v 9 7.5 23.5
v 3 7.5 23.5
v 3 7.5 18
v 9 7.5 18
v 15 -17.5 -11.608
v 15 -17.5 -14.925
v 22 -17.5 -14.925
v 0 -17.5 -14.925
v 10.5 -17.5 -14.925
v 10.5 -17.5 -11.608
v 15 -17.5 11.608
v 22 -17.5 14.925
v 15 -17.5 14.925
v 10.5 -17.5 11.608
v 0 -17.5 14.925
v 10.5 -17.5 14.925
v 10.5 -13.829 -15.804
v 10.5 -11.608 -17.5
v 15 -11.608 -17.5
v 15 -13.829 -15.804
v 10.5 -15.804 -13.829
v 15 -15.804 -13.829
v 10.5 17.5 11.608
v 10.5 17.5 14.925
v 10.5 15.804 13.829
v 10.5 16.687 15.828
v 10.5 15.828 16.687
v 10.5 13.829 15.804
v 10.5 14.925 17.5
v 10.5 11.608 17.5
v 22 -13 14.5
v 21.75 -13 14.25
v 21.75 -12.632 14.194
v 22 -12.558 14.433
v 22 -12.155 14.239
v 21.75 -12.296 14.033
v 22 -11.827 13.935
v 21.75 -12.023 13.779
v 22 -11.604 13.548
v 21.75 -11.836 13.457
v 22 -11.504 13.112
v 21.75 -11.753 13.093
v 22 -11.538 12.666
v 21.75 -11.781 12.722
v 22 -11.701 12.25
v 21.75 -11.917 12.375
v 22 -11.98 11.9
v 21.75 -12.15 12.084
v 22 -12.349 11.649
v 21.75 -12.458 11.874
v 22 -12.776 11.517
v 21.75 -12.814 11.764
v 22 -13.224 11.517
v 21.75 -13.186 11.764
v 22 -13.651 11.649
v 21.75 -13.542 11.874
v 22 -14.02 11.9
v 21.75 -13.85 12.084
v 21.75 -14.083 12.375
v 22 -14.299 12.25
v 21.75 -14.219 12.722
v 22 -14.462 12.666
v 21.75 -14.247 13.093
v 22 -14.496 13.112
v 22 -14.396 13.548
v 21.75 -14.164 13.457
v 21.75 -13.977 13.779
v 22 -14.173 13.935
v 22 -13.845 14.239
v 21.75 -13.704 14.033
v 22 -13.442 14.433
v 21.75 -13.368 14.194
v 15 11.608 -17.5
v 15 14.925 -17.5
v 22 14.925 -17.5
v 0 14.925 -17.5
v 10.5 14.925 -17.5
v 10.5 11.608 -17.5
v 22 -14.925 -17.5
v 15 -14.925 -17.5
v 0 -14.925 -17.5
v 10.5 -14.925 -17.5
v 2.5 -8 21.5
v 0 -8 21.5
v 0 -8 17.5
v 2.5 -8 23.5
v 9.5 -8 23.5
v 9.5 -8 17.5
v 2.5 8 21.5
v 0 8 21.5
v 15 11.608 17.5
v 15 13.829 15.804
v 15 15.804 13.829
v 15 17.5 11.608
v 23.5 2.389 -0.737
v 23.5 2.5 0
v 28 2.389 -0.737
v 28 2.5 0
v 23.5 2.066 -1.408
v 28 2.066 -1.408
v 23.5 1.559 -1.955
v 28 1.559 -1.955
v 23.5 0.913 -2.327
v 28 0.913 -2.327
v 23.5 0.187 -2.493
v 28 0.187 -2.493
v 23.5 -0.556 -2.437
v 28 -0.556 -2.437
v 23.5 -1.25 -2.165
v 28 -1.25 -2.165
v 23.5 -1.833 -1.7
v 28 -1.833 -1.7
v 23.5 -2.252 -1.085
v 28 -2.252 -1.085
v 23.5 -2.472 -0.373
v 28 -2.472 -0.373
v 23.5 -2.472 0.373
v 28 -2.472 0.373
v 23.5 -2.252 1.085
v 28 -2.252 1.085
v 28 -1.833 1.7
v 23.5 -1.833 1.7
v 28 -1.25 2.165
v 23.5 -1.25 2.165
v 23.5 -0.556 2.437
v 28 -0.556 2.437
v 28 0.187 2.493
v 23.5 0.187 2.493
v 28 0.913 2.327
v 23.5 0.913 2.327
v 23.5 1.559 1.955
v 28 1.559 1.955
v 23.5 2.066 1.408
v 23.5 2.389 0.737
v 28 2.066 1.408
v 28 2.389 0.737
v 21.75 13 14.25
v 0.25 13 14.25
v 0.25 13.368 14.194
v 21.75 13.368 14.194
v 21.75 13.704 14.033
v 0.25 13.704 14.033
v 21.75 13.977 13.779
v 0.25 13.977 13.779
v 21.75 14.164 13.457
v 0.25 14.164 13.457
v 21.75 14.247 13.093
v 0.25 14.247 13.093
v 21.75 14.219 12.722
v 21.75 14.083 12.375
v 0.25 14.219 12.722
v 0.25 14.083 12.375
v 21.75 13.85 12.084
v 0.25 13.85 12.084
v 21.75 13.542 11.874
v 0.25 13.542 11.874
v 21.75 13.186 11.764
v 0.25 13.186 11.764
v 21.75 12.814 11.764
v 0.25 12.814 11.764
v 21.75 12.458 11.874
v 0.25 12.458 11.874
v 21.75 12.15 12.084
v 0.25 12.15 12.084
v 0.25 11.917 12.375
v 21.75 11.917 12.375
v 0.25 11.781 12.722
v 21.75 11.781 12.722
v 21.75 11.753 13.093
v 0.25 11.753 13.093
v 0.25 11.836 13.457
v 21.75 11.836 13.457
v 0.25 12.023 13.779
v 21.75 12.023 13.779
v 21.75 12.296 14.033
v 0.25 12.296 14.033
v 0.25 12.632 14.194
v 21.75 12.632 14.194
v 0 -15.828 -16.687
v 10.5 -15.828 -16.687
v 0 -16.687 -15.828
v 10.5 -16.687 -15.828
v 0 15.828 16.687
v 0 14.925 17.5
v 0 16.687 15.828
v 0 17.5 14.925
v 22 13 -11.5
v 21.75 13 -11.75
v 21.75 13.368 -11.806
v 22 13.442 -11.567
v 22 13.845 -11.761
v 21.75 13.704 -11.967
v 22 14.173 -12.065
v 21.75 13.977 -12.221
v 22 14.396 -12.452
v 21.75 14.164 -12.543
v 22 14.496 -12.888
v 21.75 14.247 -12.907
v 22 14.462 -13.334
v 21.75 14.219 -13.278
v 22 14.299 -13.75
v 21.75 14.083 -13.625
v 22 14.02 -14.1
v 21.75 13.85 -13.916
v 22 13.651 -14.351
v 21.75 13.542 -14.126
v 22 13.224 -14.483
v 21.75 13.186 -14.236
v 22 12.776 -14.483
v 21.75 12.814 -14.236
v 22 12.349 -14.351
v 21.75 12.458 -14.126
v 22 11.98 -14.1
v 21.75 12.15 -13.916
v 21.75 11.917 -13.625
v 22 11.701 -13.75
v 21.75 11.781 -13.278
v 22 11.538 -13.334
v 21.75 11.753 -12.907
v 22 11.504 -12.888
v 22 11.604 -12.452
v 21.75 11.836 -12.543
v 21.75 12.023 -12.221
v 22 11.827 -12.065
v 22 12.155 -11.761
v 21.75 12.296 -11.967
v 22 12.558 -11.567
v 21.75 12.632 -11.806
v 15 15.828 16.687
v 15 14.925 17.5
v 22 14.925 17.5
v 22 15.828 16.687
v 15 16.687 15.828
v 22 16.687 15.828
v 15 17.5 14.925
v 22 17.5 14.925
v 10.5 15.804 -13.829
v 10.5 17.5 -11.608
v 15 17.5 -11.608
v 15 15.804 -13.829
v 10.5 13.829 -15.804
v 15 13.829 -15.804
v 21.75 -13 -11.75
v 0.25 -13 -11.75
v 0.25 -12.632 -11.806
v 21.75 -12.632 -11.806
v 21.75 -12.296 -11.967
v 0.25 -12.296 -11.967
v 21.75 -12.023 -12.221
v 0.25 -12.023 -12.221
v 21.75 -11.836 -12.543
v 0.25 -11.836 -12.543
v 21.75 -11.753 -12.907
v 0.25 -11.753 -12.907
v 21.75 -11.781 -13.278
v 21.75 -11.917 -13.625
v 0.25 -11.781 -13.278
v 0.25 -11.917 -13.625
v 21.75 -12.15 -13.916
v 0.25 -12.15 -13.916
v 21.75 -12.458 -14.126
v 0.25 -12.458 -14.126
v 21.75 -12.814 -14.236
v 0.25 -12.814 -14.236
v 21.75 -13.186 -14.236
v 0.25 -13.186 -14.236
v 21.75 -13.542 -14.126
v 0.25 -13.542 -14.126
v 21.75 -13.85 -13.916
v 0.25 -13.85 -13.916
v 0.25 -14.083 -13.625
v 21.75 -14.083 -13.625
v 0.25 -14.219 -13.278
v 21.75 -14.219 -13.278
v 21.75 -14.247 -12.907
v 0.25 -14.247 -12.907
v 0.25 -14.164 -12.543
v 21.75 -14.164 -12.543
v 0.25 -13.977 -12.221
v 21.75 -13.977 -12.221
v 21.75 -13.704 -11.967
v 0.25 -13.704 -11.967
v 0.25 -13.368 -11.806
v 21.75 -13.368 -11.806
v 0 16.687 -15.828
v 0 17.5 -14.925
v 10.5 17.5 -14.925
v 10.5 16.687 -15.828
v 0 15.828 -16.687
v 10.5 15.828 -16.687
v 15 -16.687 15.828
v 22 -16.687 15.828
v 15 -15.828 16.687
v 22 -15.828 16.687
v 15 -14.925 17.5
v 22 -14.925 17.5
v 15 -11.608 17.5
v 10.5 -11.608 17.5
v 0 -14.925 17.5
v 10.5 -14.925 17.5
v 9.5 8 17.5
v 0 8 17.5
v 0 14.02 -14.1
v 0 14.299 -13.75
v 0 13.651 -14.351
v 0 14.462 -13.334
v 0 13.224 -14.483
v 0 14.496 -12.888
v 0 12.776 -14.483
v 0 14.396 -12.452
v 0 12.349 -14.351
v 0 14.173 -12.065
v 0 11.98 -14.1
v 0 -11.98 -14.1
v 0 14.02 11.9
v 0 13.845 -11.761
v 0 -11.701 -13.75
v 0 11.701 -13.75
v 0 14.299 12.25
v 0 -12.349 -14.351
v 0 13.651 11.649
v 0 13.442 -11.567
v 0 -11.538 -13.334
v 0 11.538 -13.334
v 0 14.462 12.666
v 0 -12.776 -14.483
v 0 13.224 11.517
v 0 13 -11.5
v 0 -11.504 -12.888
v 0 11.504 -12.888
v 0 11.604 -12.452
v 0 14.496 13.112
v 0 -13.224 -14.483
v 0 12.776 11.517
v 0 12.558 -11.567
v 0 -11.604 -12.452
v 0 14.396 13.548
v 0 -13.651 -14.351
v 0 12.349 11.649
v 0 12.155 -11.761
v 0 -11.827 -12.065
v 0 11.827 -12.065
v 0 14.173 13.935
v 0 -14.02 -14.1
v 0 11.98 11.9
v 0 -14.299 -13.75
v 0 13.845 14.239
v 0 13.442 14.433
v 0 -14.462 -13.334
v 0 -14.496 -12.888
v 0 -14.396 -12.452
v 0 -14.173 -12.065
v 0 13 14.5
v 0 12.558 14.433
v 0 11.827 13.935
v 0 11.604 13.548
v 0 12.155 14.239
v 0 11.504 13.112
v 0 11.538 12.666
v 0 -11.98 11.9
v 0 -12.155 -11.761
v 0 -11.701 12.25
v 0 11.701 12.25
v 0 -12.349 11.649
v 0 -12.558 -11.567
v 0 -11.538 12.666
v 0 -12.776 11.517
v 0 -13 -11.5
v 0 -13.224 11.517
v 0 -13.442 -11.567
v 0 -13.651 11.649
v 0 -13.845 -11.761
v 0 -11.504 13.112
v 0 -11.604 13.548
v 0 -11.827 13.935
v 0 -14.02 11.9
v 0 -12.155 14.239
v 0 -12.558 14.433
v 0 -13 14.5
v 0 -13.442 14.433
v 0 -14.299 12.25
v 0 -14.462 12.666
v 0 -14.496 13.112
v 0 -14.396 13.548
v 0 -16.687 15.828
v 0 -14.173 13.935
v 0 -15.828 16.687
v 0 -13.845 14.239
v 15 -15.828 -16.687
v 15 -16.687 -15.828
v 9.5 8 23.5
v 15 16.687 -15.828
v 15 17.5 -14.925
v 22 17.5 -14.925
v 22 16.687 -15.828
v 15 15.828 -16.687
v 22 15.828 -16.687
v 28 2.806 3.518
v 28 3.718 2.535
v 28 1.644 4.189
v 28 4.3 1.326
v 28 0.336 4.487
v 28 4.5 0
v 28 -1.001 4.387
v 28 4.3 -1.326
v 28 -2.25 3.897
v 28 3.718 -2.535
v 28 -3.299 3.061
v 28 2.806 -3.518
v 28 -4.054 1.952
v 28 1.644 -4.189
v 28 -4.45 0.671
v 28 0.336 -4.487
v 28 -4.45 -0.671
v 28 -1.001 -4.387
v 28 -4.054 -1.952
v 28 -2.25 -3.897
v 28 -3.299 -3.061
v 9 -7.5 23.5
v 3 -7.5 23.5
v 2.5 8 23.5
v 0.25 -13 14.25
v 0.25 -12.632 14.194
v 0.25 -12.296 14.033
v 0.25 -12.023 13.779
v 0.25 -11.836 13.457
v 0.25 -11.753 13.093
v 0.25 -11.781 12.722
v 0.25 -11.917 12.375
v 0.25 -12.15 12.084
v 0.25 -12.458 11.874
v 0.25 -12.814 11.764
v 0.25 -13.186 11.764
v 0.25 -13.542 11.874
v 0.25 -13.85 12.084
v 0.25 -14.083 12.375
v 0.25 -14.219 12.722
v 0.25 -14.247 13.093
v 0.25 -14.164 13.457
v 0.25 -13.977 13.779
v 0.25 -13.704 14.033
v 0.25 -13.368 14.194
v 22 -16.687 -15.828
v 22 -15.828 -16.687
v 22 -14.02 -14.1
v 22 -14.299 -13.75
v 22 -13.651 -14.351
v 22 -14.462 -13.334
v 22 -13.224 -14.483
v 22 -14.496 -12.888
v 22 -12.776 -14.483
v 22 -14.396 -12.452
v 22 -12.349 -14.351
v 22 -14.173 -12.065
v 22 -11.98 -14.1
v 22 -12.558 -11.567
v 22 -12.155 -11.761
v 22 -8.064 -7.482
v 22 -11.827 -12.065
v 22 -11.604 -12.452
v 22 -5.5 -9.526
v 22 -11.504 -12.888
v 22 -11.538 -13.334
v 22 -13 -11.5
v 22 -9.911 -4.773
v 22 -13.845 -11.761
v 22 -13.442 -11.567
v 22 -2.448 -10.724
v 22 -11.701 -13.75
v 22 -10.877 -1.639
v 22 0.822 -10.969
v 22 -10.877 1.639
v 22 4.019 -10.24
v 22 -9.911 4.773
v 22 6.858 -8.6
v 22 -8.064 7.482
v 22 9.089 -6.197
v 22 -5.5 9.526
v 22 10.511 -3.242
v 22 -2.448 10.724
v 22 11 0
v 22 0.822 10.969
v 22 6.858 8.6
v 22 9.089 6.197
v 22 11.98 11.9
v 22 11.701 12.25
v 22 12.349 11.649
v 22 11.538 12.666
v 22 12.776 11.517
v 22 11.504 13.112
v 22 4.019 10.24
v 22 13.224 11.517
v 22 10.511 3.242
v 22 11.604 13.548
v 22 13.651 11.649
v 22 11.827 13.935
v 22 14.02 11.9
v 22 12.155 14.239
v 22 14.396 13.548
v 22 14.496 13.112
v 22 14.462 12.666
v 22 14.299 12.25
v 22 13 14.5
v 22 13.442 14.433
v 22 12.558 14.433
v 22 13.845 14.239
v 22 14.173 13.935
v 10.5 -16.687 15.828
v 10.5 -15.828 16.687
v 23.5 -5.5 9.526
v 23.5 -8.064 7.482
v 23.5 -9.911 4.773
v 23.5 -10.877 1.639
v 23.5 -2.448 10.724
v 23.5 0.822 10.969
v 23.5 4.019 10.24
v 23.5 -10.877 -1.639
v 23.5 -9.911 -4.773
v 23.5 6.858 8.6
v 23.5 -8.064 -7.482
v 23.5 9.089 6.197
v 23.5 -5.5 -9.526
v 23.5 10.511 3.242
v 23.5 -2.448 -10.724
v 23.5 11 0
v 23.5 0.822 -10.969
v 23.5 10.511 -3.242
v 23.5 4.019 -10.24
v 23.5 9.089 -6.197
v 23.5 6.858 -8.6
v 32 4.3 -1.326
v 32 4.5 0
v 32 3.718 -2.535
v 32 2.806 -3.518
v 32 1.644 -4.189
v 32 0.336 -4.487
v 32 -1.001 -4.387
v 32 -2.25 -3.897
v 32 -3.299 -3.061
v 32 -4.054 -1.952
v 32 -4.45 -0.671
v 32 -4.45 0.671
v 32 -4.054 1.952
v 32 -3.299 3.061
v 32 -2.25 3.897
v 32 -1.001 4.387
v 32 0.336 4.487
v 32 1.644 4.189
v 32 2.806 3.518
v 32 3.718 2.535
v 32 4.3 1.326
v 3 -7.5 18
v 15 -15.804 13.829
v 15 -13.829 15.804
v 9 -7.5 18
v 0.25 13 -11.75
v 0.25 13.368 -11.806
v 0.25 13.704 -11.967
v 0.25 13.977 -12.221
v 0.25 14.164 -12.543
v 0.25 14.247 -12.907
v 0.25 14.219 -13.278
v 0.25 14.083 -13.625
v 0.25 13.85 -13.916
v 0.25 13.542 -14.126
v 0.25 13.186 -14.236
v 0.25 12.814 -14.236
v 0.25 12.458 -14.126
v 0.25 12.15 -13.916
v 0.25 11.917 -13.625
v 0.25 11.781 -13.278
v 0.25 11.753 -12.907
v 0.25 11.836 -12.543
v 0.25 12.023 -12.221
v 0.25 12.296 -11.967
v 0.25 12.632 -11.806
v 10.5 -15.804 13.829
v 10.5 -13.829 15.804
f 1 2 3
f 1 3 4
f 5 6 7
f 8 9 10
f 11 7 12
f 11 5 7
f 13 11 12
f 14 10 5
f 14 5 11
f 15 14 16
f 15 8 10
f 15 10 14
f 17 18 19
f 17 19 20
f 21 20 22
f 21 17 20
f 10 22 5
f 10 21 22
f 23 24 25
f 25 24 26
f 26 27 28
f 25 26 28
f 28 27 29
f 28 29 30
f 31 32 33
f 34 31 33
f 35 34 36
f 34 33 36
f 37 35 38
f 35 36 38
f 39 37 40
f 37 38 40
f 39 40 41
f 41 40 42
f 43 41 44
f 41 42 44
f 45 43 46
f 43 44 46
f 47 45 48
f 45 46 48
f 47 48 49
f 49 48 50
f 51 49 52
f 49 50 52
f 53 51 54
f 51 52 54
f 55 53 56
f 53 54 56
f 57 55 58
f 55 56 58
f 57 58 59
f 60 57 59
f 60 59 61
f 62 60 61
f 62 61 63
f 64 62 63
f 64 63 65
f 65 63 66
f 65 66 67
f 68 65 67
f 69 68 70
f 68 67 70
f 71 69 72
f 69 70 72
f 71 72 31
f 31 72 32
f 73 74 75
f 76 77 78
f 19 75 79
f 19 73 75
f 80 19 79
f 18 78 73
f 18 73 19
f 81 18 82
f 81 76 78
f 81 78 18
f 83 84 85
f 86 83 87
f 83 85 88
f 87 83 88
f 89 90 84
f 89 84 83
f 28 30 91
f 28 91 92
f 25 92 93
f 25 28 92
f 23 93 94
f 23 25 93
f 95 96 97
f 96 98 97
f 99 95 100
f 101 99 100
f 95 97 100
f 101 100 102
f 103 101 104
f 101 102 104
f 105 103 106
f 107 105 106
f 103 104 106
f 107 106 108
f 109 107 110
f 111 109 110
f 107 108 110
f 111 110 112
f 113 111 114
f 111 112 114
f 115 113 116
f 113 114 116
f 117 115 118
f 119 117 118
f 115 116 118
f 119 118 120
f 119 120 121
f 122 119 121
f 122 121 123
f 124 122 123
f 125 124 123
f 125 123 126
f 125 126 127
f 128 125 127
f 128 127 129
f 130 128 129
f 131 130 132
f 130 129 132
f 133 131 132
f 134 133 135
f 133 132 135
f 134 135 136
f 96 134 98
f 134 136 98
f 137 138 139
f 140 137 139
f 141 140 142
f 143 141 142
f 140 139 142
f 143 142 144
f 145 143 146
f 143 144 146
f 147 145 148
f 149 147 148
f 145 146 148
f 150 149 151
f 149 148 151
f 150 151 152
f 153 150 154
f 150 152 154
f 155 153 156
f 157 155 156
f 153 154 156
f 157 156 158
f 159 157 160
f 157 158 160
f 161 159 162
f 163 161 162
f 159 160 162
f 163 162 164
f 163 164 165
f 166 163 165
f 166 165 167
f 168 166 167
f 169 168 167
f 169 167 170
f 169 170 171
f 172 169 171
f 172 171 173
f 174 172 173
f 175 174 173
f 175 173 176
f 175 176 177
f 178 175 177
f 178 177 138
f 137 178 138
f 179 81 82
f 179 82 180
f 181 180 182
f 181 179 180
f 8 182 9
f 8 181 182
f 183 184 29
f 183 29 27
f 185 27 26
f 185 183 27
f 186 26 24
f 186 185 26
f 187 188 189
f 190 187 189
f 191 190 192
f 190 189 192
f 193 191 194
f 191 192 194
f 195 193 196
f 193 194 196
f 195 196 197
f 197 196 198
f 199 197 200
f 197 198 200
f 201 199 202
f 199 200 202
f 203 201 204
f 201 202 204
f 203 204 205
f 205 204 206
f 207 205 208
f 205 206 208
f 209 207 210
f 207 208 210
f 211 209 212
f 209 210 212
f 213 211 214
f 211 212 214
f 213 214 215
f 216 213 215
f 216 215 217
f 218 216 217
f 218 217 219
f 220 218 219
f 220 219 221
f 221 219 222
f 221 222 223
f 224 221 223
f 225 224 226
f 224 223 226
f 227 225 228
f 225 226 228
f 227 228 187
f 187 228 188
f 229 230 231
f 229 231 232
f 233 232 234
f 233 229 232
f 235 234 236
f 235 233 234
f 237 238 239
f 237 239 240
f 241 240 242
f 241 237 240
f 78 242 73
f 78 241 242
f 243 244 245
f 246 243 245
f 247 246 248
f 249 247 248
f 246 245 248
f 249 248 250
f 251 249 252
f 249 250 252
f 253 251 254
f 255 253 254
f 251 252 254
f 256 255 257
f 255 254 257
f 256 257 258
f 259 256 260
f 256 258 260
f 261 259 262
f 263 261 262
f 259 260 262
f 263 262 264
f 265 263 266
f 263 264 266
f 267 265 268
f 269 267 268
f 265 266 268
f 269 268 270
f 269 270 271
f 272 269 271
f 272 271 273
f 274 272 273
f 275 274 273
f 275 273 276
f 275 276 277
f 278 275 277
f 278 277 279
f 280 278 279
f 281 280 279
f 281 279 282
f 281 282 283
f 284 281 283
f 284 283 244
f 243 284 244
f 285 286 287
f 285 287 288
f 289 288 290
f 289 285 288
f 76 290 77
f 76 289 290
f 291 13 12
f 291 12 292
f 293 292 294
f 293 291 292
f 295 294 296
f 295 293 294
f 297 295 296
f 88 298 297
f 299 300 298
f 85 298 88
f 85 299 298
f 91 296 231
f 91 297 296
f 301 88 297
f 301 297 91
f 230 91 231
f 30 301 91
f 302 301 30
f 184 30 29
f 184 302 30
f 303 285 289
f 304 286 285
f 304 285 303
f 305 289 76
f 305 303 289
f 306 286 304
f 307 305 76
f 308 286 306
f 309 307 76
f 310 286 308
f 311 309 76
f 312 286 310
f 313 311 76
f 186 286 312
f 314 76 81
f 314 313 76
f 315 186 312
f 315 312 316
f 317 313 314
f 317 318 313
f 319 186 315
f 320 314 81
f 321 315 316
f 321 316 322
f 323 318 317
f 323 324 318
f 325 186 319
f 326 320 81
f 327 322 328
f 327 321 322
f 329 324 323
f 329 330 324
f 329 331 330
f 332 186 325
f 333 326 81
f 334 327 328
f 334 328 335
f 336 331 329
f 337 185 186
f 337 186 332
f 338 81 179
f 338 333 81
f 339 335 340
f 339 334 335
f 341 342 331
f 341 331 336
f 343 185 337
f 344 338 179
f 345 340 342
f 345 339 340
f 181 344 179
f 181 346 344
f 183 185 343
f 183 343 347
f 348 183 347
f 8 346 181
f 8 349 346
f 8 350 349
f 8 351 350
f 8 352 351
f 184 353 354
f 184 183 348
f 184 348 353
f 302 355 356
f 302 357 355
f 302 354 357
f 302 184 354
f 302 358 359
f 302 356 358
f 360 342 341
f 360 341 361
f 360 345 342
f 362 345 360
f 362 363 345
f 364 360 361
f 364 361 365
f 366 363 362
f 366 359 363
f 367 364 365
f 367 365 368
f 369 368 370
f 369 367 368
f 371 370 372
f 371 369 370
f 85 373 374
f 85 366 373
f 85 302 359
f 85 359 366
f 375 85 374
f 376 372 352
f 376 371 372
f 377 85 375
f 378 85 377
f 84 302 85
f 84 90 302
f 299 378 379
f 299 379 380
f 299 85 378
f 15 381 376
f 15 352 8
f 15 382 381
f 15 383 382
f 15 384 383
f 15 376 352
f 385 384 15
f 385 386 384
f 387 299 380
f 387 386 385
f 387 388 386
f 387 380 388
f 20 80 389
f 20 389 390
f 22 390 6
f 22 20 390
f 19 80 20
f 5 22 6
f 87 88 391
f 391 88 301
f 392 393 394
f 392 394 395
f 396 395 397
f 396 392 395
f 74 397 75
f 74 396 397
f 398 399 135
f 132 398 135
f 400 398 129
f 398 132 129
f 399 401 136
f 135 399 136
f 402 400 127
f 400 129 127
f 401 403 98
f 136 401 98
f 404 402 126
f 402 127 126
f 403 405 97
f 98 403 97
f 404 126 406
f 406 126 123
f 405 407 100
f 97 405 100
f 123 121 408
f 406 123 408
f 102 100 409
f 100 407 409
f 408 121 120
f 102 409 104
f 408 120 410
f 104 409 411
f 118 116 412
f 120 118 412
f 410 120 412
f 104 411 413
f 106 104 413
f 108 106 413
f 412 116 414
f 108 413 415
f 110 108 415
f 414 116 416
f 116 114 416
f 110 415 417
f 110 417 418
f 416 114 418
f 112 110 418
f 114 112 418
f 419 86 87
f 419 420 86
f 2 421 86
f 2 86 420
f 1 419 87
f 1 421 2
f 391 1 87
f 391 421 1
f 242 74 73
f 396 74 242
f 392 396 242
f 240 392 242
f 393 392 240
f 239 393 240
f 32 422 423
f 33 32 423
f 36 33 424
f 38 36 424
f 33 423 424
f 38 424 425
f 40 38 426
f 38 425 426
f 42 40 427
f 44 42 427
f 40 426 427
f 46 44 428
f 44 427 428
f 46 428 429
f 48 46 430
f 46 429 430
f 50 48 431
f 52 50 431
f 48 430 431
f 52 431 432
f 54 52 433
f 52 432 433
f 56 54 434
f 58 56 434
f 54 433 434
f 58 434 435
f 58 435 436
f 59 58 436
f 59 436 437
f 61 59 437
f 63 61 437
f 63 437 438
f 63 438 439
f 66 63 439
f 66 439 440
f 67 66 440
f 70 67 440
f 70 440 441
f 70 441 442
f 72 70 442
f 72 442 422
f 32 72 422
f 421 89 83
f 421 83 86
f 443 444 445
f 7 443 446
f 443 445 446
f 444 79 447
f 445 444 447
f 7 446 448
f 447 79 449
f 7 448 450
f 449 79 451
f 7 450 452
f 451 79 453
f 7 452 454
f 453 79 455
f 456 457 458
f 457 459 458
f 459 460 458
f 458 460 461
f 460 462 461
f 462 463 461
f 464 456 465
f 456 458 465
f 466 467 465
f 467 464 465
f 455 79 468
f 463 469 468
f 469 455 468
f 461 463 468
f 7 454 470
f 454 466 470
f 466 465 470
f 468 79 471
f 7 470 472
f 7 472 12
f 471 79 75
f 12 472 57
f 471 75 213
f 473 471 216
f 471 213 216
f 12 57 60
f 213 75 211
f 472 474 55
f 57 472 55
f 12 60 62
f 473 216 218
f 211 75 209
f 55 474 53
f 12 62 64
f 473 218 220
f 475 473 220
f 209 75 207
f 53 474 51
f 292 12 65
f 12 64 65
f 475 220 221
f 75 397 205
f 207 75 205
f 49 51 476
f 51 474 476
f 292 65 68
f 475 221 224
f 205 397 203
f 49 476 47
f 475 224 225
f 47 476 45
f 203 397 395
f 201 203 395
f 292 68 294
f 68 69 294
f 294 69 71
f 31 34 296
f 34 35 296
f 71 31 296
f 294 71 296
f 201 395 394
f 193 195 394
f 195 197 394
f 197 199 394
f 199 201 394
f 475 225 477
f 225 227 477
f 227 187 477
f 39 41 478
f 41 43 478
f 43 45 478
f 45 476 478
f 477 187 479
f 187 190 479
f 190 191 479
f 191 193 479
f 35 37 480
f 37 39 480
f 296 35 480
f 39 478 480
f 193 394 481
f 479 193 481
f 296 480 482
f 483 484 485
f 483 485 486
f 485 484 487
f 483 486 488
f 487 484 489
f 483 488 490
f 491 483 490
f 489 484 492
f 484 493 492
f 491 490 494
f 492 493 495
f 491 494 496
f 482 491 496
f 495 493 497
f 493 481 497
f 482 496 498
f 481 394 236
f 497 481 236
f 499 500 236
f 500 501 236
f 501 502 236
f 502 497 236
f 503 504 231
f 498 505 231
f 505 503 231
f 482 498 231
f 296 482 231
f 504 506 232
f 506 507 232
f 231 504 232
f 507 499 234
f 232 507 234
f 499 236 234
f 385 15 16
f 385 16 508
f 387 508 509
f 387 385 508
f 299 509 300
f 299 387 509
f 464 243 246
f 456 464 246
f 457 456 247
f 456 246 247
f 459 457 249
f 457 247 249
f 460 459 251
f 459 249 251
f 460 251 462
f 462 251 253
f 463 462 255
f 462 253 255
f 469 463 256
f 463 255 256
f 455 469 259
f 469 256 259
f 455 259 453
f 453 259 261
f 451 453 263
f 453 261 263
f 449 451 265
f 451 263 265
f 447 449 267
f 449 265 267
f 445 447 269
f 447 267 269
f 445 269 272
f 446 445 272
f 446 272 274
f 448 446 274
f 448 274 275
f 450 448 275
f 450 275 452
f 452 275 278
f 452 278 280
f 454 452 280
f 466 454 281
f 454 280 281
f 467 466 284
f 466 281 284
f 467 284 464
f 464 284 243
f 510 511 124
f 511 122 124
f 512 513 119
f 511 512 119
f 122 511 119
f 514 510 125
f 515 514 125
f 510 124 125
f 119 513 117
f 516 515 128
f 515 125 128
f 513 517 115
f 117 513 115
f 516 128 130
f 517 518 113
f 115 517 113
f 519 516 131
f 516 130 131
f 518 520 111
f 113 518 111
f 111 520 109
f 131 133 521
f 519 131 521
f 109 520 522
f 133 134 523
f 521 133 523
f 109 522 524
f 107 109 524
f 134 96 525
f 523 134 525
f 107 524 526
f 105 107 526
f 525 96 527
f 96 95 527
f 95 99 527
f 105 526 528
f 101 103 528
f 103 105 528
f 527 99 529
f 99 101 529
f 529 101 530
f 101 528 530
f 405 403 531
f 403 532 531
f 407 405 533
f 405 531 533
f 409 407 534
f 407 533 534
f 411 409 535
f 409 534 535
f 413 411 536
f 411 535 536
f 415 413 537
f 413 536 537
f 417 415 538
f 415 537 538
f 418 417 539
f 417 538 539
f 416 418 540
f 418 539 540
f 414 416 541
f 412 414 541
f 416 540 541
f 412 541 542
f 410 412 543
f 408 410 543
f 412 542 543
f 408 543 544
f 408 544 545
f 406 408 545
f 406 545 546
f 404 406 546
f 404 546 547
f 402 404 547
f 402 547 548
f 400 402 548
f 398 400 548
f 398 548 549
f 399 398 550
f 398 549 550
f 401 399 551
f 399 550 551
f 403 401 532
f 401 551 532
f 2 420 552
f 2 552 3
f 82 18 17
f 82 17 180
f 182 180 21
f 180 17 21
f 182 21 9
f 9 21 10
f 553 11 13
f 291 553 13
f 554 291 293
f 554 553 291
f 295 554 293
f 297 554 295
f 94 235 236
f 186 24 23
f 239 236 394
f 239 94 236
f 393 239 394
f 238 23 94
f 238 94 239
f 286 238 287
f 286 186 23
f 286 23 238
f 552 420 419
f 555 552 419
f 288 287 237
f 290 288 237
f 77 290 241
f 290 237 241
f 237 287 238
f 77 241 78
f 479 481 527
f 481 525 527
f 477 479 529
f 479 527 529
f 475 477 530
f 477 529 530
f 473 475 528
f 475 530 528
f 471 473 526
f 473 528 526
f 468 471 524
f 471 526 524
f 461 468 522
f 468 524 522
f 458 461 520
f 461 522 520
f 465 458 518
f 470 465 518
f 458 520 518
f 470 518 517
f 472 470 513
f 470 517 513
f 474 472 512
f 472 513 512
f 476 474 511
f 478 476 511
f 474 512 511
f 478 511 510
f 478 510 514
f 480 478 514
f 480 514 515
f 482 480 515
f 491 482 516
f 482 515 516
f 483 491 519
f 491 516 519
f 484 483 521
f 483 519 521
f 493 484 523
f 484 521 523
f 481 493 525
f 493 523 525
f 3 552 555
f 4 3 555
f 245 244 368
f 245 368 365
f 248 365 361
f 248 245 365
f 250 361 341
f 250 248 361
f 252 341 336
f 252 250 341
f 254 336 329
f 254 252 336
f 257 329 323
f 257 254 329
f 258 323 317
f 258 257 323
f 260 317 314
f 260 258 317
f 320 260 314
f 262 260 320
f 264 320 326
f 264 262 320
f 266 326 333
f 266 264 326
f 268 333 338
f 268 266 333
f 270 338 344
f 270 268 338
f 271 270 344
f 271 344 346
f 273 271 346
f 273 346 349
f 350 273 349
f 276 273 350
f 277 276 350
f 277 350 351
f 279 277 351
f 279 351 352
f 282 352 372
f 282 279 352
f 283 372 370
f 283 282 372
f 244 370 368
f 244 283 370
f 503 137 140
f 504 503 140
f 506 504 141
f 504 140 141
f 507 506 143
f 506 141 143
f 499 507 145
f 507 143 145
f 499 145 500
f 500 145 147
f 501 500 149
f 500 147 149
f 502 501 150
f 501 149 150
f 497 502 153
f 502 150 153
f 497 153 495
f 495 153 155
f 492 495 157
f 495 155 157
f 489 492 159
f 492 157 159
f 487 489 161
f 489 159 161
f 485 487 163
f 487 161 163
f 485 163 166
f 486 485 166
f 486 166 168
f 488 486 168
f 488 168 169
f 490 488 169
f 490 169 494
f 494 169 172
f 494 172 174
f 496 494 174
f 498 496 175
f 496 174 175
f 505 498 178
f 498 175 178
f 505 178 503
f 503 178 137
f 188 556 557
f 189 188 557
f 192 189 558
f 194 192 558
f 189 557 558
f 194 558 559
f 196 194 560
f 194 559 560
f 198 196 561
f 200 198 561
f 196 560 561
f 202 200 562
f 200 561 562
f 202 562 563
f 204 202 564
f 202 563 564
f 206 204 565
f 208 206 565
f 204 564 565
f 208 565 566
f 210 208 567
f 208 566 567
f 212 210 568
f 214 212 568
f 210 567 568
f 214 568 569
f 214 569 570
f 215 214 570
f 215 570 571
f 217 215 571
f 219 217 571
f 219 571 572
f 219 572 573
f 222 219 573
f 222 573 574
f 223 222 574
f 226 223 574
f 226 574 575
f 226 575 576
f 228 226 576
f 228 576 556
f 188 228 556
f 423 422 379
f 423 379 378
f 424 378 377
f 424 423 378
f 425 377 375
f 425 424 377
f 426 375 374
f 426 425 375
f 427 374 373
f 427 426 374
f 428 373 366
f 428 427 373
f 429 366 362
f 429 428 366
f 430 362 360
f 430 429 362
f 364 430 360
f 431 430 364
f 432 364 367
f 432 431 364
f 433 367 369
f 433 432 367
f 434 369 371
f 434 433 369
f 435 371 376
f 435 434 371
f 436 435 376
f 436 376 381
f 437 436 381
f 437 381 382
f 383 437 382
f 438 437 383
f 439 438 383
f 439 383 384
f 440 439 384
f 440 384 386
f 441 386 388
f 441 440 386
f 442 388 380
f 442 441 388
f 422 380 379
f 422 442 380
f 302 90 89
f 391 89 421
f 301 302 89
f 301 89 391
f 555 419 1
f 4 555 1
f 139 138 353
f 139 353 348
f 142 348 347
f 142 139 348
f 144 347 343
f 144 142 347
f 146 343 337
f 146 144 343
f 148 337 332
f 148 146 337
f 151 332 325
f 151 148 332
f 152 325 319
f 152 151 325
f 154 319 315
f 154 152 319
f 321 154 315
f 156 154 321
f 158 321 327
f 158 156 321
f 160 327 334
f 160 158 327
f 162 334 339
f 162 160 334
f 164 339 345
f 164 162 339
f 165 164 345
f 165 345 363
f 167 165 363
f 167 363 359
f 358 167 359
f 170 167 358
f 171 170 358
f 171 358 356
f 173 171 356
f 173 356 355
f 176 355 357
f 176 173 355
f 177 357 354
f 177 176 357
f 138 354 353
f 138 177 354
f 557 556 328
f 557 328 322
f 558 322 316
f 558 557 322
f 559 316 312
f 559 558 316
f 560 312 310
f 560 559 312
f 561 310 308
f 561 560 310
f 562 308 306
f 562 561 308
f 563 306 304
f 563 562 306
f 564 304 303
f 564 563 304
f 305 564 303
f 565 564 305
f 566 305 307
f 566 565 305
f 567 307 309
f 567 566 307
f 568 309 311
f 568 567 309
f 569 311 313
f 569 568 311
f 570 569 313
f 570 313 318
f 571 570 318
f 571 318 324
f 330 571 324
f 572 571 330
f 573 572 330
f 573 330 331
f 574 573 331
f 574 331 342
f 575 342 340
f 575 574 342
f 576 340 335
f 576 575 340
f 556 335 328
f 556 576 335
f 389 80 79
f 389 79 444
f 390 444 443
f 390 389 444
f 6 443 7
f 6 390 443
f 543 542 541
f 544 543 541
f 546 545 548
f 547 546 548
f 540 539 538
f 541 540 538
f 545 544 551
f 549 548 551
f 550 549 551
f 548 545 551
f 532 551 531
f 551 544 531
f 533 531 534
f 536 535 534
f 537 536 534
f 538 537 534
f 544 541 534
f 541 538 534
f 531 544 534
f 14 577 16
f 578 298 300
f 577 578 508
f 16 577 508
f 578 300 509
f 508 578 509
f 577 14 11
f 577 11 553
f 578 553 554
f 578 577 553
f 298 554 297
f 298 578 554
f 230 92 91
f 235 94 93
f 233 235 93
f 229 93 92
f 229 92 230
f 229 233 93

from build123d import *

# Parameters (mm, degrees)
BOSS_EXTRUDE1_DEPTH       = 10.5
BOSS_EXTRUDE2_DEPTH       = 4.5
BOSS_EXTRUDE3_DEPTH       = 7
SKETCH4_W                 = 9.5
SKETCH4_H                 = 16
BOSS_EXTRUDE4_DEPTH       = 6
SKETCH5_W                 = 2.5
SKETCH5_H                 = 2
CUT_EXTRUDE1_DEPTH        = 26.5
SKETCH6_W                 = 6
SKETCH6_H                 = 15
CUT_EXTRUDE2_DEPTH        = 5.5
F_2_CLEARANCE_HOLE1_D     = 2.5
F_2_CLEARANCE_HOLE1_DEPTH = 22
CHAMFER1_SIZE             = 0.25


with BuildPart() as part:
    # Sketch1 → Boss-Extrude1 (new body)
    with BuildSketch(Plane(origin=(0, 0, 0), x_dir=(0, -1, 0), z_dir=(-1, 0, 0))):
        with BuildLine():
            Line((14.924811557, 17.5), (-14.924811557, 17.5))
            ThreePointArc((-14.924811557, 17.5), (-16.263455967, 16.263455967), (-17.5, 14.924811557))
            Line((-17.5, 14.924811557), (-17.5, -14.924811557))
            ThreePointArc((-17.5, -14.924811557), (-16.263455967, -16.263455967), (-14.924811557, -17.5))
            Line((-14.924811557, -17.5), (14.924811557, -17.5))
            ThreePointArc((14.924811557, -17.5), (16.263455967, -16.263455967), (17.5, -14.924811557))
            Line((17.5, -14.924811557), (17.5, 14.924811557))
            ThreePointArc((17.5, 14.924811557), (16.263455967, 16.263455967), (14.924811557, 17.5))
        make_face()
    extrude(amount=-BOSS_EXTRUDE1_DEPTH)

    # Sketch2 → Boss-Extrude2 (add)
    with BuildSketch(Plane(origin=(10.5, 0, 0), x_dir=(0, 0, -1), z_dir=(1, 0, 0))):
        with BuildLine():
            Line((-17.5, -11.608186766), (-17.5, 11.608186766))
            ThreePointArc((-17.5, 11.608186766), (-14.849242405, 14.849242405), (-11.608186766, 17.5))
            Line((-11.608186766, 17.5), (11.608186766, 17.5))
            ThreePointArc((11.608186766, 17.5), (14.849242405, 14.849242405), (17.5, 11.608186766))
            Line((17.5, 11.608186766), (17.5, -11.608186766))
            ThreePointArc((17.5, -11.608186766), (14.849242405, -14.849242405), (11.608186766, -17.5))
            Line((11.608186766, -17.5), (-11.608186766, -17.5))
            ThreePointArc((-11.608186766, -17.5), (-14.849242405, -14.849242405), (-17.5, -11.608186766))
        make_face()
    extrude(amount=BOSS_EXTRUDE2_DEPTH)

    # Sketch3 → Boss-Extrude3 (add)
    with BuildSketch(Plane(origin=(15, 0, 0), x_dir=(0, 0, -1), z_dir=(1, 0, 0))):
        with BuildLine():
            Line((17.5, 14.924811557), (17.5, -14.924811557))
            ThreePointArc((17.5, -14.924811557), (16.263455967, -16.263455967), (14.924811557, -17.5))
            Line((14.924811557, -17.5), (-14.924811557, -17.5))
            ThreePointArc((-14.924811557, -17.5), (-16.263455967, -16.263455967), (-17.5, -14.924811557))
            Line((-17.5, -14.924811557), (-17.5, 14.924811557))
            ThreePointArc((-17.5, 14.924811557), (-16.263455967, 16.263455967), (-14.924811557, 17.5))
            Line((-14.924811557, 17.5), (14.924811557, 17.5))
            ThreePointArc((14.924811557, 17.5), (16.263455967, 16.263455967), (17.5, 14.924811557))
        make_face()
    extrude(amount=BOSS_EXTRUDE3_DEPTH)

    # Sketch4 → Boss-Extrude4 (add)
    with BuildSketch(Plane.XY.offset(17.5)):
        with Locations((4.75, 0)):
            Rectangle(SKETCH4_W, SKETCH4_H)
    extrude(amount=BOSS_EXTRUDE4_DEPTH)

    # Sketch5 → Cut-Extrude1 (cut, through all)
    with BuildSketch(Plane.XZ.offset(8)):
        with Locations((1.25, 22.5)):
            Rectangle(SKETCH5_W, SKETCH5_H)
    extrude(amount=-CUT_EXTRUDE1_DEPTH, mode=Mode.SUBTRACT)

    # Sketch6 → Cut-Extrude2 (cut)
    with BuildSketch(Plane.XY.offset(23.5)):
        with Locations((6, 0)):
            Rectangle(SKETCH6_W, SKETCH6_H)
    extrude(amount=-CUT_EXTRUDE2_DEPTH, mode=Mode.SUBTRACT)

    # Sketch7 → Revolve1 (revolve)
    with BuildSketch(Plane(origin=(0, 0, 0), x_dir=(-1, 0, 0), z_dir=(0, 0, -1))):
        Polygon((-32, 4.5), (-32, 0), (-22, 0), (-22, 11), (-23.5, 11), (-23.5, 2.5), (-28, 2.5), (-28, 4.5), align=None)
    revolve(axis=Axis((32, 0, 0), (-1, 0, 0)))

    # #2 Clearance Hole1
    with Locations(Plane(origin=(22, 0, 0), x_dir=(0, 0, -1), z_dir=(1, 0, 0))):
        with Locations((-13, 13), (13, 13), (13, -13), (-13, -13)):
            Hole(F_2_CLEARANCE_HOLE1_D / 2, depth=F_2_CLEARANCE_HOLE1_DEPTH)

    # Chamfer1
    chamfer1_edges = [part.edges().sort_by_distance(p)[0] for p in [
        (22, -13, 11.75),
        (0, -13, 11.75),
        (22, -13, -14.25),
        (0, -13, -14.25),
        (22, 13, -14.25),
        (0, 13, -14.25),
        (22, 13, 11.75),
        (0, 13, 11.75),
    ]]
    chamfer(chamfer1_edges, length=CHAMFER1_SIZE)


solid = part.part
